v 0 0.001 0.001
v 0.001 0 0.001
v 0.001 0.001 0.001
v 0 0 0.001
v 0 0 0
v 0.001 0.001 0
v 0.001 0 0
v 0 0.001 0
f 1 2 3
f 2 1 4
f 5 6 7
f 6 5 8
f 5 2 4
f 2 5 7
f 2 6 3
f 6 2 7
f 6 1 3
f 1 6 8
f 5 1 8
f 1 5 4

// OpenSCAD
// Fixture: a legitimate (manifold) but degenerate-volume solid --
// below the frozen VALIDATION_GATE_DEFAULTS.minVolumeMm3 (0.001 mm3).
cube([0.001, 0.001, 0.001]);
